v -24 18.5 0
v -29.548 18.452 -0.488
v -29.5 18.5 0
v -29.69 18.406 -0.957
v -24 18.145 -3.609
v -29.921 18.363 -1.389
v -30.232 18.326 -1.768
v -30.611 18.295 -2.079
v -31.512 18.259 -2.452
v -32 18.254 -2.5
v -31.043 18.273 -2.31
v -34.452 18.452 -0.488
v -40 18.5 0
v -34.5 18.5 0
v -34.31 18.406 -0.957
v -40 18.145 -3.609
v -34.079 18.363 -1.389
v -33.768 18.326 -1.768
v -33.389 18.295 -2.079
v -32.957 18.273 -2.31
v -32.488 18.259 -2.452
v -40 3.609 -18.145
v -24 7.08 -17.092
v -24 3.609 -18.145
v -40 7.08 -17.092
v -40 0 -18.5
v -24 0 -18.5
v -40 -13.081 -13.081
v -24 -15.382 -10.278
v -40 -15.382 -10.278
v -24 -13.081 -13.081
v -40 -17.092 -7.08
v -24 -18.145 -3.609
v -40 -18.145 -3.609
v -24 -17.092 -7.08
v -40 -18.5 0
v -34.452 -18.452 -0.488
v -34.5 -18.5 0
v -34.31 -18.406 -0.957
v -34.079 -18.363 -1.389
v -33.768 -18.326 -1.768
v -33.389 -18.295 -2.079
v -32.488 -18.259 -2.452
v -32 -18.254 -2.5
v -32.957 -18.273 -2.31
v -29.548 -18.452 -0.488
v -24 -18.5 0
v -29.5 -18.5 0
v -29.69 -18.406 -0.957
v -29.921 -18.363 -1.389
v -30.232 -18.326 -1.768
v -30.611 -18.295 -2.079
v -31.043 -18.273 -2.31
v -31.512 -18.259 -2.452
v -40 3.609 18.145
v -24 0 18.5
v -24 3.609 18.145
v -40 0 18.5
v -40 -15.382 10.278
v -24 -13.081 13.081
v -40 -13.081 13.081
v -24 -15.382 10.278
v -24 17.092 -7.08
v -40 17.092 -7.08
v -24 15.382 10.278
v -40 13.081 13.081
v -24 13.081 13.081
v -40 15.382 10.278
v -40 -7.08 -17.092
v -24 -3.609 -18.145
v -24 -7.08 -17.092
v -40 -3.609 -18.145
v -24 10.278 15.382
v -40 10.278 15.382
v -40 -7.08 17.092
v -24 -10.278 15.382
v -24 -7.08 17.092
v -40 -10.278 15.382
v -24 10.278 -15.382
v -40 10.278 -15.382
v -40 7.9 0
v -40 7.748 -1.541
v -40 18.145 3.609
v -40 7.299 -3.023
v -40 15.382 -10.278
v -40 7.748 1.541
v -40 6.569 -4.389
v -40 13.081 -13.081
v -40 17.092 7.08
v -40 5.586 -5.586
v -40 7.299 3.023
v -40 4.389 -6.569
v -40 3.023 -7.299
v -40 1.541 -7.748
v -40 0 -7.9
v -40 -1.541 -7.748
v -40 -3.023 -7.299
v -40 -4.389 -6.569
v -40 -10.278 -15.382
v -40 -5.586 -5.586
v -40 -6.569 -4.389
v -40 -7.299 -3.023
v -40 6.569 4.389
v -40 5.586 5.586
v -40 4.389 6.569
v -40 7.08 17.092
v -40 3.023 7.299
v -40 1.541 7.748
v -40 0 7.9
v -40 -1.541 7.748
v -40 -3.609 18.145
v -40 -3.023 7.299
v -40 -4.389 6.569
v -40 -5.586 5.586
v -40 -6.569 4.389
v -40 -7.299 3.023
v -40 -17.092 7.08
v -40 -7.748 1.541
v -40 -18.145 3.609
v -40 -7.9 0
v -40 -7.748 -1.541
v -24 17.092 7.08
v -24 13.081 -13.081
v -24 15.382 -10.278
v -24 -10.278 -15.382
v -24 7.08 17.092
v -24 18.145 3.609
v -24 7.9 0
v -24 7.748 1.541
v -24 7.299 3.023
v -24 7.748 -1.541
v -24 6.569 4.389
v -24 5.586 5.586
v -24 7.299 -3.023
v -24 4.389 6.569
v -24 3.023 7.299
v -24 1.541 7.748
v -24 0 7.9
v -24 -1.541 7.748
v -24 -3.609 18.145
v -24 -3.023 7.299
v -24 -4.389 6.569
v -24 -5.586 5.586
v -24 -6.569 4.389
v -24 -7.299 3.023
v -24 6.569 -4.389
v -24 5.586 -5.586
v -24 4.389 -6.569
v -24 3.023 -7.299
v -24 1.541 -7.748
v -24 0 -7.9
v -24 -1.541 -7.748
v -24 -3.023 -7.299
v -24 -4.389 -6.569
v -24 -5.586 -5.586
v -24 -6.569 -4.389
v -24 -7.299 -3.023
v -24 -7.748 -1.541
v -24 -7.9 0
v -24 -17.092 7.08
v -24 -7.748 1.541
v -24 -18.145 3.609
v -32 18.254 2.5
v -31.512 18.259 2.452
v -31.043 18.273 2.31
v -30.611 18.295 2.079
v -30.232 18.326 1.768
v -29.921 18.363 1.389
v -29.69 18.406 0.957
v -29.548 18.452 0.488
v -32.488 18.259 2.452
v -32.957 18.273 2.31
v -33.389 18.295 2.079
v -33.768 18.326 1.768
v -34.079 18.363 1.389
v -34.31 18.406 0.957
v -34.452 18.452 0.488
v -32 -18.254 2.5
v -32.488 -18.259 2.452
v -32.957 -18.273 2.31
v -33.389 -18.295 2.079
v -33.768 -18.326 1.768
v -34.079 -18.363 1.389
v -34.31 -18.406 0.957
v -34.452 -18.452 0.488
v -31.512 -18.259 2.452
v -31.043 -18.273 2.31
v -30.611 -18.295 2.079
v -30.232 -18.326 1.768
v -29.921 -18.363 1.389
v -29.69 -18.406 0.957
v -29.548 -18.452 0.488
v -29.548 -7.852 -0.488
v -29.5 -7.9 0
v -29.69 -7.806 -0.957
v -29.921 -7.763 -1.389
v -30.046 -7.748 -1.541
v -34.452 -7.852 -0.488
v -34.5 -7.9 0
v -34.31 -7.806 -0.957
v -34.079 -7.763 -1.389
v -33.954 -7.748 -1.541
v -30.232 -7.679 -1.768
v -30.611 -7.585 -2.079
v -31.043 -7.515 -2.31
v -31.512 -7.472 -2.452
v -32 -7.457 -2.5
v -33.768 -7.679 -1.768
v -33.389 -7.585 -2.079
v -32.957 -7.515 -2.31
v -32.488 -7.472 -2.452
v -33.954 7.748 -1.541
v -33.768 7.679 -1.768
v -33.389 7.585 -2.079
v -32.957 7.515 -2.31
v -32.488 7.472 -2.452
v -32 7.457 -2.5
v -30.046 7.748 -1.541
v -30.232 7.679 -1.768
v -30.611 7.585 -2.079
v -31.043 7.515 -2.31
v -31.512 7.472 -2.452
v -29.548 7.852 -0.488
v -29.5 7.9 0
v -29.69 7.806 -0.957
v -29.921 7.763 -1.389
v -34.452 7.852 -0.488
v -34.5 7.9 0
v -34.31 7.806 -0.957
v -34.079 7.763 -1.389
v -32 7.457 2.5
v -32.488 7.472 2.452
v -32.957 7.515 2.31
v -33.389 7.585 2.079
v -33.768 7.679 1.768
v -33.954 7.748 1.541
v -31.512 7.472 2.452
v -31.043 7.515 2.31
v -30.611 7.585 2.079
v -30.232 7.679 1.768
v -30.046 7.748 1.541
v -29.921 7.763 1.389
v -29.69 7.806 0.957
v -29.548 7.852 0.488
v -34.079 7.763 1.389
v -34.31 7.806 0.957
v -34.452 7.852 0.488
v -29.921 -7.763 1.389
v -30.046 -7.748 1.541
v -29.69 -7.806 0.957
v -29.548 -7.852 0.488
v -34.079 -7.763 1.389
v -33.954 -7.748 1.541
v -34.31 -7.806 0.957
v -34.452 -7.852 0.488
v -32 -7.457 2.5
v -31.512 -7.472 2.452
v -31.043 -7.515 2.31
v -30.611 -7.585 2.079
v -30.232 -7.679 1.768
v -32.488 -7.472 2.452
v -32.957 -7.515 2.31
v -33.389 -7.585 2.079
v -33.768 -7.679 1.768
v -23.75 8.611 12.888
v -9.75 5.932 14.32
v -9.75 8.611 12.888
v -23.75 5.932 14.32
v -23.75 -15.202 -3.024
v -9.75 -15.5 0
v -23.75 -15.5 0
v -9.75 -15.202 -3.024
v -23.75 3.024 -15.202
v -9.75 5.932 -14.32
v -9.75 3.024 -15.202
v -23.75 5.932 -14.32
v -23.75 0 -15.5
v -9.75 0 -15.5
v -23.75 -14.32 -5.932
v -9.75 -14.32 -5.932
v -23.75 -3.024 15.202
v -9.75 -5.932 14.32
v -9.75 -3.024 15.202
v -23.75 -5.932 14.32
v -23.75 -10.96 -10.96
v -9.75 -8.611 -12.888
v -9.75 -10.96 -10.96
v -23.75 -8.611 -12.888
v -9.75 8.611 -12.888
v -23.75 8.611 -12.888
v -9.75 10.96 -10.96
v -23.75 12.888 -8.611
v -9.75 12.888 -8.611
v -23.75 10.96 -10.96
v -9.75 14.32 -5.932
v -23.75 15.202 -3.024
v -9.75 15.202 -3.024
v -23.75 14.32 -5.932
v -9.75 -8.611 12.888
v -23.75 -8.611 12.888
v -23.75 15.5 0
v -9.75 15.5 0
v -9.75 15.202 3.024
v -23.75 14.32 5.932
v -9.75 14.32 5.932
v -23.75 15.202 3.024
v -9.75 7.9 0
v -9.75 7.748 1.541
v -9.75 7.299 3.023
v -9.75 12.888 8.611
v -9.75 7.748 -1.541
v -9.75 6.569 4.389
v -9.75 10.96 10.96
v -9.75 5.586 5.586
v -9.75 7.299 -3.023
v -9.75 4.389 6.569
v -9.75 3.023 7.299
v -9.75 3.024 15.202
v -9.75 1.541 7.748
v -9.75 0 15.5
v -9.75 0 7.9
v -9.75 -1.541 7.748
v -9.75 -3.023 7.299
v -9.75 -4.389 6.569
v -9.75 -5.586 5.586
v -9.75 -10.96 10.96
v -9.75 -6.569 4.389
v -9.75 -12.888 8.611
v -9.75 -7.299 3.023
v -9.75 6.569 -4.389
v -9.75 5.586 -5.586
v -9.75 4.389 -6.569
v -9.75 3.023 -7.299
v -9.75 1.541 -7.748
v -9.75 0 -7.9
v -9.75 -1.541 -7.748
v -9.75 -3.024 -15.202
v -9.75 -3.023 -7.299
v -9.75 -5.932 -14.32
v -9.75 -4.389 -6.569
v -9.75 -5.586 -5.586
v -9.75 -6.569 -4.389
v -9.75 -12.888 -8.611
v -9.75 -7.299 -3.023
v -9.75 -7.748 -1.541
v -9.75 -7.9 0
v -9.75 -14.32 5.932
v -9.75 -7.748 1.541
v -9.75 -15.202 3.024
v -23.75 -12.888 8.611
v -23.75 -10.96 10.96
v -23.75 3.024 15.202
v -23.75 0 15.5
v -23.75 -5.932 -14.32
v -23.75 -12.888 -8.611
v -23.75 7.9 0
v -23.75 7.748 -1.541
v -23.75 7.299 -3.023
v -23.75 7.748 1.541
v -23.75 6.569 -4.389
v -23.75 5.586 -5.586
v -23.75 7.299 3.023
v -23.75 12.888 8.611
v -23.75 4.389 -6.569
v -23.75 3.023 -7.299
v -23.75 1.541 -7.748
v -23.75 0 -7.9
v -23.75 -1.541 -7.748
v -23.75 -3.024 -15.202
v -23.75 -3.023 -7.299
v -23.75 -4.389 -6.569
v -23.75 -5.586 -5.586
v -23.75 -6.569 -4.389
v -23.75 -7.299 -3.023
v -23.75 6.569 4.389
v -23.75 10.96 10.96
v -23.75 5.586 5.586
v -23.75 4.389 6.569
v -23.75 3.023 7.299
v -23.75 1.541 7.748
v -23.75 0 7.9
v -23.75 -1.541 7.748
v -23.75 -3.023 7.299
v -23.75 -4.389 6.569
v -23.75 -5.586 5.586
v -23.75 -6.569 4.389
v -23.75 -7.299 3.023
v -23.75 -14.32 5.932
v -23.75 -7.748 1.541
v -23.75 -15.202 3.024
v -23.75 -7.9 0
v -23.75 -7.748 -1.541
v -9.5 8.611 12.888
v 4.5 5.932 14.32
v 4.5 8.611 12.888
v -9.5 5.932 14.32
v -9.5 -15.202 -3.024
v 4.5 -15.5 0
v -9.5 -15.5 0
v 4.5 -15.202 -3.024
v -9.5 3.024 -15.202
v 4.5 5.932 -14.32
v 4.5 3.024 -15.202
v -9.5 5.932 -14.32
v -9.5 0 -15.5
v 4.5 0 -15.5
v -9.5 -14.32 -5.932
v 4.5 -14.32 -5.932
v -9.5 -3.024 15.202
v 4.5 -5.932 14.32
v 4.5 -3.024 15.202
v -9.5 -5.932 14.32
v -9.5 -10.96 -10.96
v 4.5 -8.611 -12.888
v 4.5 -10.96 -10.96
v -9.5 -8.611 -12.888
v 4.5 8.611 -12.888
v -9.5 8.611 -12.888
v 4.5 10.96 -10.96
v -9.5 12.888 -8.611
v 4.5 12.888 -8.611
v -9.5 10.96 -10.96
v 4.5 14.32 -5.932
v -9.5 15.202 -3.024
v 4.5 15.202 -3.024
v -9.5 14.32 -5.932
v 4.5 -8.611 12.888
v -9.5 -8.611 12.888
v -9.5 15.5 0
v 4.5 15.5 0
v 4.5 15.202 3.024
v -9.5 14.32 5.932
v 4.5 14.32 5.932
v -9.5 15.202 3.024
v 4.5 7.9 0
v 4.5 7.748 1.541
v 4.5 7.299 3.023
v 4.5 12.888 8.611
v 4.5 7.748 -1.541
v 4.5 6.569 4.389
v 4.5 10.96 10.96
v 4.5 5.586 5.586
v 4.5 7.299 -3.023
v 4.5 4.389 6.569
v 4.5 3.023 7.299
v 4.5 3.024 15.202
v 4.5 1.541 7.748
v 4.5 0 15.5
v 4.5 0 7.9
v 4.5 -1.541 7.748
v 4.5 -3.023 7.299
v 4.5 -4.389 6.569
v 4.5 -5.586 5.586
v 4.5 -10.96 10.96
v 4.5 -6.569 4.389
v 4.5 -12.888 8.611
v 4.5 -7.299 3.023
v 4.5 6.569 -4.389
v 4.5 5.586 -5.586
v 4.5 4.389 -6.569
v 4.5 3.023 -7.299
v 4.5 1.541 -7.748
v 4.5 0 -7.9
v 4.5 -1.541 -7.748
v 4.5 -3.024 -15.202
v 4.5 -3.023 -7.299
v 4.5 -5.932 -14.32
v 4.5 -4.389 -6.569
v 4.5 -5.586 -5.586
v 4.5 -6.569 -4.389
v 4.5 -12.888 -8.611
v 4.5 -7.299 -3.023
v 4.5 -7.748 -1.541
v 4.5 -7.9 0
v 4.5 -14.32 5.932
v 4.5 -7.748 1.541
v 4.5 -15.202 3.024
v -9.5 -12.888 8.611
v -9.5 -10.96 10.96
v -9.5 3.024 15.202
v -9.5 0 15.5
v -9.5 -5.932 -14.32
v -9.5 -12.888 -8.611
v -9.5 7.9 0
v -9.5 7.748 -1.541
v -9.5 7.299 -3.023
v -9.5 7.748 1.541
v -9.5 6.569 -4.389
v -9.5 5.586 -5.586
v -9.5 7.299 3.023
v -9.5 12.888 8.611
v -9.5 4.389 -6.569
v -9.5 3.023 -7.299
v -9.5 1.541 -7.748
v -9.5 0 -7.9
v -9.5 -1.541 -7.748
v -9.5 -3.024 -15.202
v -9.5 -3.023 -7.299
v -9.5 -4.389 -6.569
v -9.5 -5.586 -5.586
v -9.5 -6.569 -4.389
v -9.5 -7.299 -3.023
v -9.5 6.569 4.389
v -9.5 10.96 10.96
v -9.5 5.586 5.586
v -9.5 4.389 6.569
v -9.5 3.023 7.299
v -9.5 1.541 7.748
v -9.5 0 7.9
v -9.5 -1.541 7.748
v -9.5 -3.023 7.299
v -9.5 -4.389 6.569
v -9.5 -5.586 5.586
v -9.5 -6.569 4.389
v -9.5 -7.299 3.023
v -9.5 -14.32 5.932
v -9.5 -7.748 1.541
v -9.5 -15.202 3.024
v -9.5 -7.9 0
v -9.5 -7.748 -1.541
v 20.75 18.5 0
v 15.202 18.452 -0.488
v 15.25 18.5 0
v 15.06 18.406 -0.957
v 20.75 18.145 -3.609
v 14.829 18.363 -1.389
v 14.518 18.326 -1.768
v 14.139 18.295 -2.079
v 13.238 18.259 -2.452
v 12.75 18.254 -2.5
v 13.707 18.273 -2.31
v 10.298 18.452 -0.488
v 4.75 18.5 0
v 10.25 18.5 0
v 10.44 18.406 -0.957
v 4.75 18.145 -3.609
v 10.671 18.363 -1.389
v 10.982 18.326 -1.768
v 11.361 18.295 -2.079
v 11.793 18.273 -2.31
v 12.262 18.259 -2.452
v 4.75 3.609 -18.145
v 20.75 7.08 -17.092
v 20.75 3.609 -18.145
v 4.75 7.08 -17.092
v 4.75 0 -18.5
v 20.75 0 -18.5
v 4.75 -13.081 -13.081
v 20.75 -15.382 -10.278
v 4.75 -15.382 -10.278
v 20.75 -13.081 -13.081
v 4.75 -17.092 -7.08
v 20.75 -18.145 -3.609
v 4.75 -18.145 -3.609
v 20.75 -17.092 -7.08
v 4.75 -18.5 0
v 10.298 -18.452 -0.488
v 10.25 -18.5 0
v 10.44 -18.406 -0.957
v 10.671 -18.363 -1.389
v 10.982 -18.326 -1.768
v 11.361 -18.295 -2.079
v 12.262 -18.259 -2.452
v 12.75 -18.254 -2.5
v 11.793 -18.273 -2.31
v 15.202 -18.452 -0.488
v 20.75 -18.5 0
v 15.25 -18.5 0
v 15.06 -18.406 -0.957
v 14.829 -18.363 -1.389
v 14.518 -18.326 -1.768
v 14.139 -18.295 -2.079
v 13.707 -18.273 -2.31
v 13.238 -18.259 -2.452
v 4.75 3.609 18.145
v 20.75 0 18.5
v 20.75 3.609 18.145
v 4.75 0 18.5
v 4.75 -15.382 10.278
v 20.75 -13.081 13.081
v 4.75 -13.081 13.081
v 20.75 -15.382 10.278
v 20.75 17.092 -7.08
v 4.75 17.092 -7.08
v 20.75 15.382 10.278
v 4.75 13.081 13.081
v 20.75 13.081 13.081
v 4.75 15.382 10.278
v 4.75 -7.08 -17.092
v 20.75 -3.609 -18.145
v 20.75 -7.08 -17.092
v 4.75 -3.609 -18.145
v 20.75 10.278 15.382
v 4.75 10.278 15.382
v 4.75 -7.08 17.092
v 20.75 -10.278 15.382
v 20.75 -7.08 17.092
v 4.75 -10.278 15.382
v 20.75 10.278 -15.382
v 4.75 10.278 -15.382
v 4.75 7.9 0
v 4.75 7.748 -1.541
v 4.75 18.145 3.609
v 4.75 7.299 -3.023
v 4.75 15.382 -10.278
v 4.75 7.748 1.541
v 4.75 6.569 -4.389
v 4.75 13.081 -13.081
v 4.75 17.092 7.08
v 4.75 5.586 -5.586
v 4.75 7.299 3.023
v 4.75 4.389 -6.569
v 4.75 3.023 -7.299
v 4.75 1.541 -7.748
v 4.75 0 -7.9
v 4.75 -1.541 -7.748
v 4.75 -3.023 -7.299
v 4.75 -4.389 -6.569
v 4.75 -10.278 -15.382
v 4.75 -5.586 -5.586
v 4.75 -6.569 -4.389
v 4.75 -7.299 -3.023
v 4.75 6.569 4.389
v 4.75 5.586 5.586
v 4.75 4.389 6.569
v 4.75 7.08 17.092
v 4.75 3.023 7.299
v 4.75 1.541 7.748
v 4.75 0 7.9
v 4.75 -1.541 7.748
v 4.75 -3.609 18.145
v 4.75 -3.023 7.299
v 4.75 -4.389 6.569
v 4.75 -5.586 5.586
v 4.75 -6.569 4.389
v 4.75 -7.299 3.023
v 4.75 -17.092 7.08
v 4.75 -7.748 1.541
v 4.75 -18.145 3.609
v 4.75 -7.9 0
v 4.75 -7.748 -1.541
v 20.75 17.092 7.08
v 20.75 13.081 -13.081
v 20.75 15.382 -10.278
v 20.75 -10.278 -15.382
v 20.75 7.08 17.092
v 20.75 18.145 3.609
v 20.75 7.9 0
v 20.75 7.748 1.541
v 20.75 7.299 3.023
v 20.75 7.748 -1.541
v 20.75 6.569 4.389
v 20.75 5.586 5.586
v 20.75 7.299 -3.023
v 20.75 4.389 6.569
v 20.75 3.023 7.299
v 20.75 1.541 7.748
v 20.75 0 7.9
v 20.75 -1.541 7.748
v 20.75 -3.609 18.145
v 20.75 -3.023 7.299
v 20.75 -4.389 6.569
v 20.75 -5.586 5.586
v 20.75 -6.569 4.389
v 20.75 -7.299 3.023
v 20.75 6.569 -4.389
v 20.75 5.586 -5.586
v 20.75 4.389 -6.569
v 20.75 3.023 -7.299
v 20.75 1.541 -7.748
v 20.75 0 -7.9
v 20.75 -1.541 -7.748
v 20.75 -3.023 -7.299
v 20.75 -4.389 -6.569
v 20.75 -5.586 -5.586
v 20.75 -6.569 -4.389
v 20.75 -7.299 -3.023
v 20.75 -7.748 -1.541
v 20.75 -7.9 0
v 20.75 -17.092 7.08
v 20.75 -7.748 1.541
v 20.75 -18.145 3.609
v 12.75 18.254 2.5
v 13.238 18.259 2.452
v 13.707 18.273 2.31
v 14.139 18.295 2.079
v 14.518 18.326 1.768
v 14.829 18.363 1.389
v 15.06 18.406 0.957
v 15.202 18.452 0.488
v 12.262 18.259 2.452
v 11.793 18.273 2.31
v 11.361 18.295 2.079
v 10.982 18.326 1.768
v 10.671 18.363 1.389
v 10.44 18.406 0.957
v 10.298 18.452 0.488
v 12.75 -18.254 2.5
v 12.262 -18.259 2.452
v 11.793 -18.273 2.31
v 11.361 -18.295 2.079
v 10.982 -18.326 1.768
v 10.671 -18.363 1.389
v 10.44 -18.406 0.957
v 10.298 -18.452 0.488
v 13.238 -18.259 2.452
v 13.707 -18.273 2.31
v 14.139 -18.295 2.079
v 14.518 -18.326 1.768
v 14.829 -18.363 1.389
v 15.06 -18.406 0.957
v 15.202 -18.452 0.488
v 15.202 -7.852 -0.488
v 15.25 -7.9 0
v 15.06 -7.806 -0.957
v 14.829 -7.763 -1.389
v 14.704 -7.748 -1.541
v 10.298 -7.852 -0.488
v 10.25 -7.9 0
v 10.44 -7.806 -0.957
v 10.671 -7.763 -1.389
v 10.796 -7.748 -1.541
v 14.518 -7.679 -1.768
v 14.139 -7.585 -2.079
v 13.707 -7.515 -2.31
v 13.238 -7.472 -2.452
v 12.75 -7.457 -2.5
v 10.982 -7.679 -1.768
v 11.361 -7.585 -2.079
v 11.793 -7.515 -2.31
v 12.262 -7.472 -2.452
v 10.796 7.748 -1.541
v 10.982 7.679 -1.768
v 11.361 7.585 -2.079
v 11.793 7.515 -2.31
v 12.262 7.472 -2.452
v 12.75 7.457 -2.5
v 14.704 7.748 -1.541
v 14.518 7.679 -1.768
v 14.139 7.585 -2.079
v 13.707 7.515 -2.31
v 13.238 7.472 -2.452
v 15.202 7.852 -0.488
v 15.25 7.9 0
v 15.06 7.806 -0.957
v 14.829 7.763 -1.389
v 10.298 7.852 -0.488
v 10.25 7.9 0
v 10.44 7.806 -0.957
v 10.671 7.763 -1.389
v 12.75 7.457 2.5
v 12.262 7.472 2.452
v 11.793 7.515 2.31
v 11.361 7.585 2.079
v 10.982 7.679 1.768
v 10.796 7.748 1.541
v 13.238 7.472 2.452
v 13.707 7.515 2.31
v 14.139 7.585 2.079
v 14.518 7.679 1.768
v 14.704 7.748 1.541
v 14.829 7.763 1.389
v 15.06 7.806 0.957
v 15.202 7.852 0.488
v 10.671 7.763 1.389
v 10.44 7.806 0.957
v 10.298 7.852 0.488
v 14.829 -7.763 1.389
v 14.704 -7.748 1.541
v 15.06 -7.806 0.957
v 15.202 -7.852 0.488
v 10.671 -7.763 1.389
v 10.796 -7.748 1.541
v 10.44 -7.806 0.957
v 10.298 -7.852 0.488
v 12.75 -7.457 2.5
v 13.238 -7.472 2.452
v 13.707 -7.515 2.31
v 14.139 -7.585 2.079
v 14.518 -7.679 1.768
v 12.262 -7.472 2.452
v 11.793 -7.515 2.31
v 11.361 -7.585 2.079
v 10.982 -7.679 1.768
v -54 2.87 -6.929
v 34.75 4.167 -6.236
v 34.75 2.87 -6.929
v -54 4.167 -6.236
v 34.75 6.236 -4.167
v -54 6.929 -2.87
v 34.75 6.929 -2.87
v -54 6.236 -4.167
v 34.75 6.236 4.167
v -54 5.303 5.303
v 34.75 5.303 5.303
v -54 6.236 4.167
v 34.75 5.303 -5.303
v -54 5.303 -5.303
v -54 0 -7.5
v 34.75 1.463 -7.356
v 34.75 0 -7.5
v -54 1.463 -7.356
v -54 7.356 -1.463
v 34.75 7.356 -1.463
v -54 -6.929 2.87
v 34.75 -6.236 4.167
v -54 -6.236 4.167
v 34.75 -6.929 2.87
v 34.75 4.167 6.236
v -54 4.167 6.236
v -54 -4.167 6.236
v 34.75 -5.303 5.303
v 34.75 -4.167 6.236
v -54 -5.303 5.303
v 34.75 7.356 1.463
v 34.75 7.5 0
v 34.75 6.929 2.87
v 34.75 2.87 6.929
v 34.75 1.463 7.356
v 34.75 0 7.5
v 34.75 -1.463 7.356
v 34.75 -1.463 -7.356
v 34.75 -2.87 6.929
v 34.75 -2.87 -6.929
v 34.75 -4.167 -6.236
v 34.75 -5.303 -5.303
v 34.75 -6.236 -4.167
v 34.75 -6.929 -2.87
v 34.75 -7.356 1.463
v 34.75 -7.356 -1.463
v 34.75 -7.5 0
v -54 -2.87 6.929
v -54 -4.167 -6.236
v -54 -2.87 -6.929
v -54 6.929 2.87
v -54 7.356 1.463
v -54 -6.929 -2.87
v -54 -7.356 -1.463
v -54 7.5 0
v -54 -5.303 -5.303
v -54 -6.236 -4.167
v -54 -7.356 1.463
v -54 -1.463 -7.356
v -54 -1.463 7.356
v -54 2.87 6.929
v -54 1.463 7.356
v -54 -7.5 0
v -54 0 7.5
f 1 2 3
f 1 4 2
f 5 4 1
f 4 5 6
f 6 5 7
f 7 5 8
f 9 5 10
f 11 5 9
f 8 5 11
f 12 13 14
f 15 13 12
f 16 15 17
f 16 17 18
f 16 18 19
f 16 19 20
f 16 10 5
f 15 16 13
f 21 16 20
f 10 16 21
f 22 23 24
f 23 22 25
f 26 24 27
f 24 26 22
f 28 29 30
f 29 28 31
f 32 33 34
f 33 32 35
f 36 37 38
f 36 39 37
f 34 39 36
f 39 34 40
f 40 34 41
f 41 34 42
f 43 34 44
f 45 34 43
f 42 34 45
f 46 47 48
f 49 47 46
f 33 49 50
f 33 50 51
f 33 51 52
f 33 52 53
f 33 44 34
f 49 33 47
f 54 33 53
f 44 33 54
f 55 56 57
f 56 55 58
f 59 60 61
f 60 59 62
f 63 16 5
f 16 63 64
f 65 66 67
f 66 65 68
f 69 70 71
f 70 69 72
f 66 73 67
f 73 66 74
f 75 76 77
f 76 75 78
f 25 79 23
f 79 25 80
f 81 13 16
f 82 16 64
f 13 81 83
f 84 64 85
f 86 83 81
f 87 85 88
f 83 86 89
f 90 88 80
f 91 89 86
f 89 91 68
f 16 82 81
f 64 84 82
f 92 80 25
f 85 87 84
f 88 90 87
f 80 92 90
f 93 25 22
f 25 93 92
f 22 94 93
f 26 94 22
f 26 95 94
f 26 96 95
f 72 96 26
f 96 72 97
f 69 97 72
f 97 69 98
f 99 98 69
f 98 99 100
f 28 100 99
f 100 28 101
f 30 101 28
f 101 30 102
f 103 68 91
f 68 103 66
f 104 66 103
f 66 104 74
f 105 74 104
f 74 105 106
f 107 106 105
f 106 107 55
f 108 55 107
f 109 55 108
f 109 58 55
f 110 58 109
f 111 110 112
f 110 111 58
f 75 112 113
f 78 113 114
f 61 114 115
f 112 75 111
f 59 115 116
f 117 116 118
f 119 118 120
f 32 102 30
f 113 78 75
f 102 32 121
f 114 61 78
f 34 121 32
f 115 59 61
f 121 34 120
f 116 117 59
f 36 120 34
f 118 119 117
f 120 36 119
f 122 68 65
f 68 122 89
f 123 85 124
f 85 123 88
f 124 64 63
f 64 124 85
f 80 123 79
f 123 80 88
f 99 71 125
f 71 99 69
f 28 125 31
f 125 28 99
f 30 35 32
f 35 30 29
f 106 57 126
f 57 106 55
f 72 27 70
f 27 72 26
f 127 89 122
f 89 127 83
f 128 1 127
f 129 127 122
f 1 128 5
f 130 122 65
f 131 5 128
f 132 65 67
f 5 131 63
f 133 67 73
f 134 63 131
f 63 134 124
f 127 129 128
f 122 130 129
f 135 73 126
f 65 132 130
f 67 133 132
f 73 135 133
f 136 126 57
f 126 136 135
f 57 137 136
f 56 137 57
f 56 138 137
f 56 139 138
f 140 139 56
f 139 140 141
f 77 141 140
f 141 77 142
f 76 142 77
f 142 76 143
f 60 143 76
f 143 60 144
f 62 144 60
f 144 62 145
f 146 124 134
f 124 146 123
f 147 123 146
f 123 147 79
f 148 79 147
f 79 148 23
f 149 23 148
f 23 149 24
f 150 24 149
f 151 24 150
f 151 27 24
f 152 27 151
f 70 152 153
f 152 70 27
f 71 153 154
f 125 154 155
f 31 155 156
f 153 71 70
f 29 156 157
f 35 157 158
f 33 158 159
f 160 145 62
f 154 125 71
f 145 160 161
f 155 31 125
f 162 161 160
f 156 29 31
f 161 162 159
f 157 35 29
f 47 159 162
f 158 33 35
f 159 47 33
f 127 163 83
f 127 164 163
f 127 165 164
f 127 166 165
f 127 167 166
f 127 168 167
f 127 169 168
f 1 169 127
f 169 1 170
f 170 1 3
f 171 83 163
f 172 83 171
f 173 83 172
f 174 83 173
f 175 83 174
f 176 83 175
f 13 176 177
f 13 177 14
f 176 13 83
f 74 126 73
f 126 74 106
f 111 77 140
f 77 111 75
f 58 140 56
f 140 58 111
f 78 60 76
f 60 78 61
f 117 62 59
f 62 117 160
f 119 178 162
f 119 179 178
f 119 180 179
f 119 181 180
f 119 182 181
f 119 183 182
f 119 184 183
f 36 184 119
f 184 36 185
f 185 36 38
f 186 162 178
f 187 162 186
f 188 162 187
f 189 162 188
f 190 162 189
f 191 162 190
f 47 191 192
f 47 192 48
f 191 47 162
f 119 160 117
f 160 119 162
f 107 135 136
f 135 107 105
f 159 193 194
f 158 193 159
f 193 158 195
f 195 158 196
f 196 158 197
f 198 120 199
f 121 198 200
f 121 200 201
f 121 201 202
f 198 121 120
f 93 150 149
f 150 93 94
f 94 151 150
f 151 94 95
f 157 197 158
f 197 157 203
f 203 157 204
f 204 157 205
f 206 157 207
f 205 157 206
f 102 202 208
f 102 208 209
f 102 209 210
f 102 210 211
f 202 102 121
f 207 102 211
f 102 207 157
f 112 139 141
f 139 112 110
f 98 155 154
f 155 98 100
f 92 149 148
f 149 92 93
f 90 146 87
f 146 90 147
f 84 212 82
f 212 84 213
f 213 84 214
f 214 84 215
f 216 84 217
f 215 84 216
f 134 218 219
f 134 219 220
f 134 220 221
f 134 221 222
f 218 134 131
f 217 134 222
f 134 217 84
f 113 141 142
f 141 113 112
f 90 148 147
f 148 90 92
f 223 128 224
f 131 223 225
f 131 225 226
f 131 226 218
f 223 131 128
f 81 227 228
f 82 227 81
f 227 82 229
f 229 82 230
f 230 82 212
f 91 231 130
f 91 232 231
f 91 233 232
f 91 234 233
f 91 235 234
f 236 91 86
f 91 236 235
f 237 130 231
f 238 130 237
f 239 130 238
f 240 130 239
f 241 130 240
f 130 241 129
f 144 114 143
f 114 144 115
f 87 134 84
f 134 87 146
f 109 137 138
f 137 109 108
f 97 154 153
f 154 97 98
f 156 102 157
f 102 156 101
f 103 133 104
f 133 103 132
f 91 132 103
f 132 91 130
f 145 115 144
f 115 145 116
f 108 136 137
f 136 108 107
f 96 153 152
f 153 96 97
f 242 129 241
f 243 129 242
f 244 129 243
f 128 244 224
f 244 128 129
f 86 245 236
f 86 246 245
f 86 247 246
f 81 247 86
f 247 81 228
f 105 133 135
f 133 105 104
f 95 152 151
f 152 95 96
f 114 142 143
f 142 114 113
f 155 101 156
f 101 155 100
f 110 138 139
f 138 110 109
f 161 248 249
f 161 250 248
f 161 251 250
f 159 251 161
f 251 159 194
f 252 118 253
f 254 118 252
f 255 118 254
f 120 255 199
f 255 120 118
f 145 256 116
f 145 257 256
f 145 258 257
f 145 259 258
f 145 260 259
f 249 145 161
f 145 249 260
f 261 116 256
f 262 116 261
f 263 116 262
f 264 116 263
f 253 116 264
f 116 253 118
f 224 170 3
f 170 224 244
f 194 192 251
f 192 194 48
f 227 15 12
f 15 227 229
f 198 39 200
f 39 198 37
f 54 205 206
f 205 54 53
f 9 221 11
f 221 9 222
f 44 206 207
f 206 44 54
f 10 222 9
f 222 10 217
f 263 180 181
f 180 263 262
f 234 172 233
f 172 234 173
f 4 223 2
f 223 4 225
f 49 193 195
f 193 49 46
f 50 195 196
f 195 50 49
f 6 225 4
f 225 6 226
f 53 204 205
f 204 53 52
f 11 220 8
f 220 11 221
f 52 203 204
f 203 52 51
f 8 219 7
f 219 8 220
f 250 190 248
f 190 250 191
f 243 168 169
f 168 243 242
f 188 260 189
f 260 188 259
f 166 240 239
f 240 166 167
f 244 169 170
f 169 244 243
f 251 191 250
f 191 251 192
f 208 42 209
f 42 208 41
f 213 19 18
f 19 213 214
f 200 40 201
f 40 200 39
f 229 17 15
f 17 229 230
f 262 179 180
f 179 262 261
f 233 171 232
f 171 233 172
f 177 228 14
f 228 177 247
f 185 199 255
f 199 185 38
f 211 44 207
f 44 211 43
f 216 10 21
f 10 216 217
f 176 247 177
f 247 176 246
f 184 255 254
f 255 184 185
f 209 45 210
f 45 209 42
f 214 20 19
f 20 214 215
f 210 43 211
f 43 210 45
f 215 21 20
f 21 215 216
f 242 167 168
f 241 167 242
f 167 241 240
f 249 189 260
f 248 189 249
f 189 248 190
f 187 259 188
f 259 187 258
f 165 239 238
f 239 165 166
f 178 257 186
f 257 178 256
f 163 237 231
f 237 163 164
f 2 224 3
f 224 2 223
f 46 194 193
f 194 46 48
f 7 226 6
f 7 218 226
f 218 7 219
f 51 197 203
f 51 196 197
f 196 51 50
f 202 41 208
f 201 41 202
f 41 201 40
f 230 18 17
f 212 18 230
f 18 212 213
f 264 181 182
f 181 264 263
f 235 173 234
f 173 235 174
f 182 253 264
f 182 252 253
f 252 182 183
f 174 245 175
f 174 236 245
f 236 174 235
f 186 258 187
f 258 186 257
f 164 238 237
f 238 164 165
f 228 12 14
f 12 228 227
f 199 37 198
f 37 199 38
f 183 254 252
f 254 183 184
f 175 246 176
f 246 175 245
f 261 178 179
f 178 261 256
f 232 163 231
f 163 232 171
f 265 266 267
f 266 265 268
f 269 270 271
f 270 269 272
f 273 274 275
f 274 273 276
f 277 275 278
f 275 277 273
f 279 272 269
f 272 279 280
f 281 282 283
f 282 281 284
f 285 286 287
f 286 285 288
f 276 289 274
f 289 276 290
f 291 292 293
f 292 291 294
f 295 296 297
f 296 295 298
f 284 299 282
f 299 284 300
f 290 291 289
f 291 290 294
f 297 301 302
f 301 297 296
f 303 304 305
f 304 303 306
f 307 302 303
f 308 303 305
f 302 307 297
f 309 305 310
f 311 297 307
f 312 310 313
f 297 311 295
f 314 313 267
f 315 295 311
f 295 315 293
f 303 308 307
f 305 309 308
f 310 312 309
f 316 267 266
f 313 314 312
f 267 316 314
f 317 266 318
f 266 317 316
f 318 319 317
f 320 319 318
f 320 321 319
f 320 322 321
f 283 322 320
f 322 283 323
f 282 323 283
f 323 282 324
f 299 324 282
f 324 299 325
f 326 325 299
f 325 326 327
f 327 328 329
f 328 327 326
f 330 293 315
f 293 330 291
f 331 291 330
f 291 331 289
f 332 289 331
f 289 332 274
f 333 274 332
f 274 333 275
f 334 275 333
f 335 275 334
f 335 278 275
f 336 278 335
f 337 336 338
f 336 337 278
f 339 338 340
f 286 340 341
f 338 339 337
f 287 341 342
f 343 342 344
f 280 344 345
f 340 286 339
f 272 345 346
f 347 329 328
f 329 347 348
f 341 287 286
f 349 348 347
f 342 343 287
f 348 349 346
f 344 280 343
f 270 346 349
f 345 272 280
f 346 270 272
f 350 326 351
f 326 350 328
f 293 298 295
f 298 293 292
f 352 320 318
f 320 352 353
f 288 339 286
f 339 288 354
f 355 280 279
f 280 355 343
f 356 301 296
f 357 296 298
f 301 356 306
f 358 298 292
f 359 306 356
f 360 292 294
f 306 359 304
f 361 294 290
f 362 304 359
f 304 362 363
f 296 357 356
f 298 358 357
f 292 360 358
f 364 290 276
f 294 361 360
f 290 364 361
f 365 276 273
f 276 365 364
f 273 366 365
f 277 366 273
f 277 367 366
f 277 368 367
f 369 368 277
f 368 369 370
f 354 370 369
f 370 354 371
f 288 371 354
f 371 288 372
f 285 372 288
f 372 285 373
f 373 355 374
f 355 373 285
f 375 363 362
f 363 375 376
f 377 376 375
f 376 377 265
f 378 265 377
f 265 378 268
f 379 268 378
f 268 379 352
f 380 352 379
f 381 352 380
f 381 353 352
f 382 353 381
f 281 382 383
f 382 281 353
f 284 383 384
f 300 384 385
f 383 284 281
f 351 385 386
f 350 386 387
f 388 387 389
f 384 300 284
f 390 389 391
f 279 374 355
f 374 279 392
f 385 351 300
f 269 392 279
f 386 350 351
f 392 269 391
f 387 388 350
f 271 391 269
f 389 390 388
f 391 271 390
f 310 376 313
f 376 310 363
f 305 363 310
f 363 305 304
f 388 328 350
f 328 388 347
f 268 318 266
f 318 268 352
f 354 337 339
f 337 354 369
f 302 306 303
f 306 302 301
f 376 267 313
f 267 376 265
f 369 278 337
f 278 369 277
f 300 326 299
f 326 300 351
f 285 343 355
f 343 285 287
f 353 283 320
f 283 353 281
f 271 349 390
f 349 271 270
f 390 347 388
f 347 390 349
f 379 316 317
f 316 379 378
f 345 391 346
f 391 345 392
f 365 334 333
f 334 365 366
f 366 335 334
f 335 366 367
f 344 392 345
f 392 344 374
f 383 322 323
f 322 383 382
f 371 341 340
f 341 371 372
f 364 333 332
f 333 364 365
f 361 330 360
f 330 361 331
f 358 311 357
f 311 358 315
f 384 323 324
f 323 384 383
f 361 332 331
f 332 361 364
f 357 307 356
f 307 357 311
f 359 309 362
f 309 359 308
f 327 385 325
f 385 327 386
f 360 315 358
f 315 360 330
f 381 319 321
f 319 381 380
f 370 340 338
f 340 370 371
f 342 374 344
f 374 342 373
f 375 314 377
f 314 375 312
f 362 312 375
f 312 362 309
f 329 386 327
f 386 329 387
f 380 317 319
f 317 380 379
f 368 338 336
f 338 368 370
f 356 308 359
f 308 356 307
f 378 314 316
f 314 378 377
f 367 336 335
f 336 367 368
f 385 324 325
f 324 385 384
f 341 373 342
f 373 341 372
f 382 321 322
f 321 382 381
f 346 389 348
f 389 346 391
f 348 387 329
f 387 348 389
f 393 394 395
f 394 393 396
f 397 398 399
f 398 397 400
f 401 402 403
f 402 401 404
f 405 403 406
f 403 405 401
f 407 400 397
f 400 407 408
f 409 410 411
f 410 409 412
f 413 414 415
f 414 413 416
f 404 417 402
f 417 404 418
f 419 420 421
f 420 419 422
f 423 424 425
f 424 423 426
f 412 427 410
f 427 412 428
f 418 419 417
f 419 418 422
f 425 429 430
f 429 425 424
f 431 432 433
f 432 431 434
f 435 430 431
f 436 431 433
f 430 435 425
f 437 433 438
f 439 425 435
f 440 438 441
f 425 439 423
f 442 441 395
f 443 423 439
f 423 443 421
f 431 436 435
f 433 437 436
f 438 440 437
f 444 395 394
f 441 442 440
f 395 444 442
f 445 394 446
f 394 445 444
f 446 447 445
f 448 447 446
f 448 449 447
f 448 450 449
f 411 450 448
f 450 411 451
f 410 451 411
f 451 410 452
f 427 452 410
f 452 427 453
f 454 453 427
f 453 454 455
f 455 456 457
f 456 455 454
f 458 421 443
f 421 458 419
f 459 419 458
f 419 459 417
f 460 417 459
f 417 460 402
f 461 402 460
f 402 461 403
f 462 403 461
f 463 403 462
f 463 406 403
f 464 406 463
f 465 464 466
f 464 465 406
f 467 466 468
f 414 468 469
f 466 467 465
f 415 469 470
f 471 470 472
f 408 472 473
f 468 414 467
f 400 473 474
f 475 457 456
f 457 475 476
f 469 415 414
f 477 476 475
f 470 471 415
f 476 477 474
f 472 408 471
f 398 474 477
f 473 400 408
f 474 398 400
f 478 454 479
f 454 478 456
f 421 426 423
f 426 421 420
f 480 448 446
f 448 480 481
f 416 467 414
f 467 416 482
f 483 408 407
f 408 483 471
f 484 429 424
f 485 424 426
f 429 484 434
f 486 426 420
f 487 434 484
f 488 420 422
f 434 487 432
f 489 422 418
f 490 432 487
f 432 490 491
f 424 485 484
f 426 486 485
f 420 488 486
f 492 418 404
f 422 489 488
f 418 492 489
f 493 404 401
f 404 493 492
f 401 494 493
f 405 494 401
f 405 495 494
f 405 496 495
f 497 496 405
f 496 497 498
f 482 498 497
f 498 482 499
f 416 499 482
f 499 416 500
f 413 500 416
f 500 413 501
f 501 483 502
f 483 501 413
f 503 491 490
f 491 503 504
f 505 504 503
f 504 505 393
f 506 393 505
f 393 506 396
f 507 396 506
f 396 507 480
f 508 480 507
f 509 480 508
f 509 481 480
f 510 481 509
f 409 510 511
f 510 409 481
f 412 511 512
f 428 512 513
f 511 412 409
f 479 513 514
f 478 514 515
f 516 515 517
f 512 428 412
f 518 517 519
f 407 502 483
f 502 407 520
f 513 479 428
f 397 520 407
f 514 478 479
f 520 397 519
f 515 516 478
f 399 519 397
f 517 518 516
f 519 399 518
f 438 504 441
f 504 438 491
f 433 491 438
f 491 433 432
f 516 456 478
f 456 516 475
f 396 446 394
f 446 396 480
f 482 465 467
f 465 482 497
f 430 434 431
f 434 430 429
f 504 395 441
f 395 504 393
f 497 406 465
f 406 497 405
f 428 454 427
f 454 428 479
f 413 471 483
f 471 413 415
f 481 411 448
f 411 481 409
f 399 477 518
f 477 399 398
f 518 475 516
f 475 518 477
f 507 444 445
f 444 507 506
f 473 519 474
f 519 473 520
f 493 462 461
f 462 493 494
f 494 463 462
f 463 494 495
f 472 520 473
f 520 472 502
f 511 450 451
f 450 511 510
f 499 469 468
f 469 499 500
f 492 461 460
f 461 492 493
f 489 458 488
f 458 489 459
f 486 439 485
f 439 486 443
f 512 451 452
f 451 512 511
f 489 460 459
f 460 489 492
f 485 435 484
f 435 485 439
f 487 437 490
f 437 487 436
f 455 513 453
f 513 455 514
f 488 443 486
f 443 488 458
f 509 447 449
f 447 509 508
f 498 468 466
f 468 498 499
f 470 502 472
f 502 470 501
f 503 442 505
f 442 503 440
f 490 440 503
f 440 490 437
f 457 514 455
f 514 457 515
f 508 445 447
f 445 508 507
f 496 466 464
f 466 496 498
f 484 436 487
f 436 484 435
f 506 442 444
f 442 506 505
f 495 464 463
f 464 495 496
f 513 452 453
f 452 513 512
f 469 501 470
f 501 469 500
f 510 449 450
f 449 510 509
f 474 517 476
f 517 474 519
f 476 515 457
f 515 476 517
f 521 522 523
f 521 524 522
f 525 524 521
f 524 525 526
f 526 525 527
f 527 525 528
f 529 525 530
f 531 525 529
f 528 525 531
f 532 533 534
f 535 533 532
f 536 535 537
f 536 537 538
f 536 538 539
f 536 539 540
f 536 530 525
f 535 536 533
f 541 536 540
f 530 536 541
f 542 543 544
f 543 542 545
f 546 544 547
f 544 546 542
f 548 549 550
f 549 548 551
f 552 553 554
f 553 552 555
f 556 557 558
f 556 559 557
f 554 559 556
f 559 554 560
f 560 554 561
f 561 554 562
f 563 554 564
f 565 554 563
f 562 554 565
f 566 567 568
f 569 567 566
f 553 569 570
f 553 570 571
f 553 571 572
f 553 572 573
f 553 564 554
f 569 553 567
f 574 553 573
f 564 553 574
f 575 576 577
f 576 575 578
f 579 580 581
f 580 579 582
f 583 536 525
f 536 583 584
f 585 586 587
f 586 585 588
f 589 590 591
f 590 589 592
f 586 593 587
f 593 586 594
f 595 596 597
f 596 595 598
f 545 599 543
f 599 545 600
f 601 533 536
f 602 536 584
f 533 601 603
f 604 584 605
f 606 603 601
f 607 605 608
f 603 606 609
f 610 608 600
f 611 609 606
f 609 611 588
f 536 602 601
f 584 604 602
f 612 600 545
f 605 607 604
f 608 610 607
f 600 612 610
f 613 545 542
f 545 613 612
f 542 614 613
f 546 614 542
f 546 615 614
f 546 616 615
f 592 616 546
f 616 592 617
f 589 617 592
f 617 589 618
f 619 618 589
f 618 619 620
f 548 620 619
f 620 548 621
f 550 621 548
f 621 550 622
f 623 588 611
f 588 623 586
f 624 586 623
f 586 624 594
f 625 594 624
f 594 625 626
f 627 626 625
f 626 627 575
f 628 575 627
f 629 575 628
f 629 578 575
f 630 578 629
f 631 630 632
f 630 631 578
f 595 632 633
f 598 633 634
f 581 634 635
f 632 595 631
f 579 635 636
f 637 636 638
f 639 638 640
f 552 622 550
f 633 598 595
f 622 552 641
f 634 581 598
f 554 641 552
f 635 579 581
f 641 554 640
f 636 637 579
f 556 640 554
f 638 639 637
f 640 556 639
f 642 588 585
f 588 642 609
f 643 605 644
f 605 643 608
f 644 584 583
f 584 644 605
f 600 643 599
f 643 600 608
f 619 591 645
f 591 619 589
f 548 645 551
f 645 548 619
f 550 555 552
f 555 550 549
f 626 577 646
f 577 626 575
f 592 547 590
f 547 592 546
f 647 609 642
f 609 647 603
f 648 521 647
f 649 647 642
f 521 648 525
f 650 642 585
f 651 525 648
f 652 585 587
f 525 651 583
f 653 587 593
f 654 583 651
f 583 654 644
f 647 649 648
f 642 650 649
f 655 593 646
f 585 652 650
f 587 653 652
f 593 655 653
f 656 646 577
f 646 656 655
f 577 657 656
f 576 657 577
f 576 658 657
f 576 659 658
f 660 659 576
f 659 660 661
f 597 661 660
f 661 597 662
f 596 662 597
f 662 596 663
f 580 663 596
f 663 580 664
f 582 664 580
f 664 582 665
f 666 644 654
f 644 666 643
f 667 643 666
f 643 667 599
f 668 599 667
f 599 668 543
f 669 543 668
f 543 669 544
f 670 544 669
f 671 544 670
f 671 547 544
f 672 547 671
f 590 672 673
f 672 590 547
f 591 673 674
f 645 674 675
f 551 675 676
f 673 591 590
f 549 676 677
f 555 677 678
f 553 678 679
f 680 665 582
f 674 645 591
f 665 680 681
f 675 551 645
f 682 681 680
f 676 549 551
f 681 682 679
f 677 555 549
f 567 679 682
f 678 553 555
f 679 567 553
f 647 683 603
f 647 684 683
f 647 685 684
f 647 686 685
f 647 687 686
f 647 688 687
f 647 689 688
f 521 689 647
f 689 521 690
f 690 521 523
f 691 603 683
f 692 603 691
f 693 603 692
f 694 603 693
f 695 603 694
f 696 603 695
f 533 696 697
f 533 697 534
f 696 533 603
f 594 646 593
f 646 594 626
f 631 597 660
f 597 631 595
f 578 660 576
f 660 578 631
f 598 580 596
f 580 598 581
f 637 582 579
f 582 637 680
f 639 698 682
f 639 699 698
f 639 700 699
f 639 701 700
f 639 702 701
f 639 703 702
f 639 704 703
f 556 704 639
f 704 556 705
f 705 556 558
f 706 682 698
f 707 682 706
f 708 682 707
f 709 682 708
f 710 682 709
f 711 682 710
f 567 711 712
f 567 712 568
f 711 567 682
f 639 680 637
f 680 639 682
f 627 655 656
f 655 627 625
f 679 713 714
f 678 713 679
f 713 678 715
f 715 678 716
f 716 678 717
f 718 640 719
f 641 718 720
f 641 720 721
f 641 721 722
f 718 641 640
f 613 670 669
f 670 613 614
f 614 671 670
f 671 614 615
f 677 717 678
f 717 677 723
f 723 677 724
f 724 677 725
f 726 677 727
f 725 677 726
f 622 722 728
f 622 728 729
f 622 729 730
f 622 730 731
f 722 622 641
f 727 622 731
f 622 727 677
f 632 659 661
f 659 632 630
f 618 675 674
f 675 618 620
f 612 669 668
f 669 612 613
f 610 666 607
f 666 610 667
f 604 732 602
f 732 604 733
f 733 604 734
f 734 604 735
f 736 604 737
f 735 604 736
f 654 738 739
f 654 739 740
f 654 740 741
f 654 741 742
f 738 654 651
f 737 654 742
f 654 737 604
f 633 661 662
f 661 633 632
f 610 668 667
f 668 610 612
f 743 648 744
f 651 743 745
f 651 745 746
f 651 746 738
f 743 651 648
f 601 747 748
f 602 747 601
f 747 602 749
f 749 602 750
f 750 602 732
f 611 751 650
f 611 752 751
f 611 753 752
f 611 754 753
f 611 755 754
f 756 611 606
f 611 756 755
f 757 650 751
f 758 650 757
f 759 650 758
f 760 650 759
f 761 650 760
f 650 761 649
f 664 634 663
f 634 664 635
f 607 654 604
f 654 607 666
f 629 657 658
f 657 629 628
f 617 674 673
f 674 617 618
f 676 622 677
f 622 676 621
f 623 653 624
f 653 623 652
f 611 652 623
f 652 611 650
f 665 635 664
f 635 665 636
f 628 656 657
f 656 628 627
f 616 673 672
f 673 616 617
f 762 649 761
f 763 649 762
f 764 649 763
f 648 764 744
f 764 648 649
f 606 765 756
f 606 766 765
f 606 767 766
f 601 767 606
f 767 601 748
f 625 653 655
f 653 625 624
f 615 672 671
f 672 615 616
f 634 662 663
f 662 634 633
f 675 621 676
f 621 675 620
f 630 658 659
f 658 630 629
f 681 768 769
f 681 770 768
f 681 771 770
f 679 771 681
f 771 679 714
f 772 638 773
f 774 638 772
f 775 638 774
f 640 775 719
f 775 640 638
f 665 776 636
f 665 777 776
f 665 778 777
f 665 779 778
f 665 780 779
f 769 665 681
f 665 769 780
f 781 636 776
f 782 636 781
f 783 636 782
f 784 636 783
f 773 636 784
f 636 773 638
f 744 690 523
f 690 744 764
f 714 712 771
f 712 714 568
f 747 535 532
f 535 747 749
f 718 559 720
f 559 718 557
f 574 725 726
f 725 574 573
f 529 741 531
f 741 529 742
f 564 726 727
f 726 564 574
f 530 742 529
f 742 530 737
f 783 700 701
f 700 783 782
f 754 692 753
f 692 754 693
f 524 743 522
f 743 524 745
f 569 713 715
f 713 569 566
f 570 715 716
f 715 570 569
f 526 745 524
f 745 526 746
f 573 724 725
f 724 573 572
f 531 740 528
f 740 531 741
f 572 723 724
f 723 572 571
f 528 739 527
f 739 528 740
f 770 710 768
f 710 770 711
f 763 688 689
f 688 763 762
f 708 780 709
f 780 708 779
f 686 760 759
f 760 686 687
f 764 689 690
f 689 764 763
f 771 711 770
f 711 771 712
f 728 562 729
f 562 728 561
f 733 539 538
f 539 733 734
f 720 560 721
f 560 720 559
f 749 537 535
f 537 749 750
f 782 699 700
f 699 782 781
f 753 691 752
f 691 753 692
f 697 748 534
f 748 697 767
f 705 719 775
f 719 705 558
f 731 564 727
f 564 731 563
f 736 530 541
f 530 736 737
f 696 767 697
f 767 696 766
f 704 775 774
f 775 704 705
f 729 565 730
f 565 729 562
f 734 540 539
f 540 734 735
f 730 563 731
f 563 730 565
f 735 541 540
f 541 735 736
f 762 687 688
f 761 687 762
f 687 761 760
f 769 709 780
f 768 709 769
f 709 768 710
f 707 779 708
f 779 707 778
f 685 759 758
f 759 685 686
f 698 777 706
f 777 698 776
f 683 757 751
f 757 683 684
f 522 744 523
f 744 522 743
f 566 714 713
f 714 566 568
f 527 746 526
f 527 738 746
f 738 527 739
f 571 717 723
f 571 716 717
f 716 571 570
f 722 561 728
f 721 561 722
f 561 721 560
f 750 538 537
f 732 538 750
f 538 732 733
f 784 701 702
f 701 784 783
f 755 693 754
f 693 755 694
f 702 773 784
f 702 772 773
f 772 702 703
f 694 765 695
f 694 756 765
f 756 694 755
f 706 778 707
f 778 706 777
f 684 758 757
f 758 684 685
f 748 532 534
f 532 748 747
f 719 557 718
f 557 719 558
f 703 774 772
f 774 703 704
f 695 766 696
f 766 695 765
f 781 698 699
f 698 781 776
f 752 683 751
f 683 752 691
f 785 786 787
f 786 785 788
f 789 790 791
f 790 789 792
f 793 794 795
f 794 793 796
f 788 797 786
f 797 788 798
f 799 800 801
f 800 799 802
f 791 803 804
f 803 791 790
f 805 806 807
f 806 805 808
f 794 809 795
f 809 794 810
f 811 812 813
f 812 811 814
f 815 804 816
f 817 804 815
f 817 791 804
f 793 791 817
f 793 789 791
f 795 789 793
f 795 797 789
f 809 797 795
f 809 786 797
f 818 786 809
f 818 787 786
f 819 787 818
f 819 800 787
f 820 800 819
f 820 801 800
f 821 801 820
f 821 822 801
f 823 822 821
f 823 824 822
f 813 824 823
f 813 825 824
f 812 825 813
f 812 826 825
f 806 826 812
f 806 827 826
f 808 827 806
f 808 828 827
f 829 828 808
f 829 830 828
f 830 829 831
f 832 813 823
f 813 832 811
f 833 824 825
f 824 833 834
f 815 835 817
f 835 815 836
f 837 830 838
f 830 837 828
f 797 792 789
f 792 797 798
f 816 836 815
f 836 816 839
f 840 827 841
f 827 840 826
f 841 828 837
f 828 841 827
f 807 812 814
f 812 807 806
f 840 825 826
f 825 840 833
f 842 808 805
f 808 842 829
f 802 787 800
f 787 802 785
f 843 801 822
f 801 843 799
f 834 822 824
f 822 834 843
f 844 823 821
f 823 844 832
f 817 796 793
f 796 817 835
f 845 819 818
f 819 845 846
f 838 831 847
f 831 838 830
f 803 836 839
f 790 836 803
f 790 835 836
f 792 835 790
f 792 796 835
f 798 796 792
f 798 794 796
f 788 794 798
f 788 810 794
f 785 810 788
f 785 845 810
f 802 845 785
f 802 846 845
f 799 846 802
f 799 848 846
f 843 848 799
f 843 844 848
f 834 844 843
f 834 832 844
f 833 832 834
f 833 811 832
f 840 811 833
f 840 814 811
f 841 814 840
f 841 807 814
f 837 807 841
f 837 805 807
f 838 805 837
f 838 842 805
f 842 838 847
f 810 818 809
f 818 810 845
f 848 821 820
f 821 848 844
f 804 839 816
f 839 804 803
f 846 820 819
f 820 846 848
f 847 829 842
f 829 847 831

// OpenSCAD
$fn = 32;

// ------------------------------------------------------------------------
// Shaft with rings and collars: d15 shaft, 4 rings
// Every part is its own module, assembly() places them once.
// ------------------------------------------------------------------------

// --- part 1 ---
module shaft() {
  translate([0, 0, -44.375]) cylinder(h = 88.75, d = 15);
}

// --- part 2 ---
module collar_a() {
  difference() {
    cylinder(h = 16, d = 37);
    translate([0, 0, -1]) cylinder(h = 18, d = 15.8);
    translate([0, 0, 8]) rotate([90, 0, 0]) cylinder(h = 39, d = 5, center = true);
  }
}

// --- part 3 ---
module spacer_a() {
  difference() {
      translate([0, 0, 0]) cylinder(h = 14, d = 31);
      translate([0, 0, -1]) cylinder(h = 16, d = 15.8);
    }
}

// --- part 4 ---
module spacer_b() {
  difference() {
      translate([0, 0, 0]) cylinder(h = 14, d = 31);
      translate([0, 0, -1]) cylinder(h = 16, d = 15.8);
    }
}

// --- part 5 ---
module collar_b() {
  difference() {
    cylinder(h = 16, d = 37);
    translate([0, 0, -1]) cylinder(h = 18, d = 15.8);
    translate([0, 0, 8]) rotate([90, 0, 0]) cylinder(h = 39, d = 5, center = true);
  }
}

// --- assembly ---
module assembly() {
  translate([-9.625, 0, 0]) rotate([0, 90, 0]) shaft();
  translate([-40, 0, 0]) rotate([0, 90, 0]) collar_a();
  translate([-23.75, 0, 0]) rotate([0, 90, 0]) spacer_a();
  translate([-9.5, 0, 0]) rotate([0, 90, 0]) spacer_b();
  translate([4.75, 0, 0]) rotate([0, 90, 0]) collar_b();
}

assembly();
